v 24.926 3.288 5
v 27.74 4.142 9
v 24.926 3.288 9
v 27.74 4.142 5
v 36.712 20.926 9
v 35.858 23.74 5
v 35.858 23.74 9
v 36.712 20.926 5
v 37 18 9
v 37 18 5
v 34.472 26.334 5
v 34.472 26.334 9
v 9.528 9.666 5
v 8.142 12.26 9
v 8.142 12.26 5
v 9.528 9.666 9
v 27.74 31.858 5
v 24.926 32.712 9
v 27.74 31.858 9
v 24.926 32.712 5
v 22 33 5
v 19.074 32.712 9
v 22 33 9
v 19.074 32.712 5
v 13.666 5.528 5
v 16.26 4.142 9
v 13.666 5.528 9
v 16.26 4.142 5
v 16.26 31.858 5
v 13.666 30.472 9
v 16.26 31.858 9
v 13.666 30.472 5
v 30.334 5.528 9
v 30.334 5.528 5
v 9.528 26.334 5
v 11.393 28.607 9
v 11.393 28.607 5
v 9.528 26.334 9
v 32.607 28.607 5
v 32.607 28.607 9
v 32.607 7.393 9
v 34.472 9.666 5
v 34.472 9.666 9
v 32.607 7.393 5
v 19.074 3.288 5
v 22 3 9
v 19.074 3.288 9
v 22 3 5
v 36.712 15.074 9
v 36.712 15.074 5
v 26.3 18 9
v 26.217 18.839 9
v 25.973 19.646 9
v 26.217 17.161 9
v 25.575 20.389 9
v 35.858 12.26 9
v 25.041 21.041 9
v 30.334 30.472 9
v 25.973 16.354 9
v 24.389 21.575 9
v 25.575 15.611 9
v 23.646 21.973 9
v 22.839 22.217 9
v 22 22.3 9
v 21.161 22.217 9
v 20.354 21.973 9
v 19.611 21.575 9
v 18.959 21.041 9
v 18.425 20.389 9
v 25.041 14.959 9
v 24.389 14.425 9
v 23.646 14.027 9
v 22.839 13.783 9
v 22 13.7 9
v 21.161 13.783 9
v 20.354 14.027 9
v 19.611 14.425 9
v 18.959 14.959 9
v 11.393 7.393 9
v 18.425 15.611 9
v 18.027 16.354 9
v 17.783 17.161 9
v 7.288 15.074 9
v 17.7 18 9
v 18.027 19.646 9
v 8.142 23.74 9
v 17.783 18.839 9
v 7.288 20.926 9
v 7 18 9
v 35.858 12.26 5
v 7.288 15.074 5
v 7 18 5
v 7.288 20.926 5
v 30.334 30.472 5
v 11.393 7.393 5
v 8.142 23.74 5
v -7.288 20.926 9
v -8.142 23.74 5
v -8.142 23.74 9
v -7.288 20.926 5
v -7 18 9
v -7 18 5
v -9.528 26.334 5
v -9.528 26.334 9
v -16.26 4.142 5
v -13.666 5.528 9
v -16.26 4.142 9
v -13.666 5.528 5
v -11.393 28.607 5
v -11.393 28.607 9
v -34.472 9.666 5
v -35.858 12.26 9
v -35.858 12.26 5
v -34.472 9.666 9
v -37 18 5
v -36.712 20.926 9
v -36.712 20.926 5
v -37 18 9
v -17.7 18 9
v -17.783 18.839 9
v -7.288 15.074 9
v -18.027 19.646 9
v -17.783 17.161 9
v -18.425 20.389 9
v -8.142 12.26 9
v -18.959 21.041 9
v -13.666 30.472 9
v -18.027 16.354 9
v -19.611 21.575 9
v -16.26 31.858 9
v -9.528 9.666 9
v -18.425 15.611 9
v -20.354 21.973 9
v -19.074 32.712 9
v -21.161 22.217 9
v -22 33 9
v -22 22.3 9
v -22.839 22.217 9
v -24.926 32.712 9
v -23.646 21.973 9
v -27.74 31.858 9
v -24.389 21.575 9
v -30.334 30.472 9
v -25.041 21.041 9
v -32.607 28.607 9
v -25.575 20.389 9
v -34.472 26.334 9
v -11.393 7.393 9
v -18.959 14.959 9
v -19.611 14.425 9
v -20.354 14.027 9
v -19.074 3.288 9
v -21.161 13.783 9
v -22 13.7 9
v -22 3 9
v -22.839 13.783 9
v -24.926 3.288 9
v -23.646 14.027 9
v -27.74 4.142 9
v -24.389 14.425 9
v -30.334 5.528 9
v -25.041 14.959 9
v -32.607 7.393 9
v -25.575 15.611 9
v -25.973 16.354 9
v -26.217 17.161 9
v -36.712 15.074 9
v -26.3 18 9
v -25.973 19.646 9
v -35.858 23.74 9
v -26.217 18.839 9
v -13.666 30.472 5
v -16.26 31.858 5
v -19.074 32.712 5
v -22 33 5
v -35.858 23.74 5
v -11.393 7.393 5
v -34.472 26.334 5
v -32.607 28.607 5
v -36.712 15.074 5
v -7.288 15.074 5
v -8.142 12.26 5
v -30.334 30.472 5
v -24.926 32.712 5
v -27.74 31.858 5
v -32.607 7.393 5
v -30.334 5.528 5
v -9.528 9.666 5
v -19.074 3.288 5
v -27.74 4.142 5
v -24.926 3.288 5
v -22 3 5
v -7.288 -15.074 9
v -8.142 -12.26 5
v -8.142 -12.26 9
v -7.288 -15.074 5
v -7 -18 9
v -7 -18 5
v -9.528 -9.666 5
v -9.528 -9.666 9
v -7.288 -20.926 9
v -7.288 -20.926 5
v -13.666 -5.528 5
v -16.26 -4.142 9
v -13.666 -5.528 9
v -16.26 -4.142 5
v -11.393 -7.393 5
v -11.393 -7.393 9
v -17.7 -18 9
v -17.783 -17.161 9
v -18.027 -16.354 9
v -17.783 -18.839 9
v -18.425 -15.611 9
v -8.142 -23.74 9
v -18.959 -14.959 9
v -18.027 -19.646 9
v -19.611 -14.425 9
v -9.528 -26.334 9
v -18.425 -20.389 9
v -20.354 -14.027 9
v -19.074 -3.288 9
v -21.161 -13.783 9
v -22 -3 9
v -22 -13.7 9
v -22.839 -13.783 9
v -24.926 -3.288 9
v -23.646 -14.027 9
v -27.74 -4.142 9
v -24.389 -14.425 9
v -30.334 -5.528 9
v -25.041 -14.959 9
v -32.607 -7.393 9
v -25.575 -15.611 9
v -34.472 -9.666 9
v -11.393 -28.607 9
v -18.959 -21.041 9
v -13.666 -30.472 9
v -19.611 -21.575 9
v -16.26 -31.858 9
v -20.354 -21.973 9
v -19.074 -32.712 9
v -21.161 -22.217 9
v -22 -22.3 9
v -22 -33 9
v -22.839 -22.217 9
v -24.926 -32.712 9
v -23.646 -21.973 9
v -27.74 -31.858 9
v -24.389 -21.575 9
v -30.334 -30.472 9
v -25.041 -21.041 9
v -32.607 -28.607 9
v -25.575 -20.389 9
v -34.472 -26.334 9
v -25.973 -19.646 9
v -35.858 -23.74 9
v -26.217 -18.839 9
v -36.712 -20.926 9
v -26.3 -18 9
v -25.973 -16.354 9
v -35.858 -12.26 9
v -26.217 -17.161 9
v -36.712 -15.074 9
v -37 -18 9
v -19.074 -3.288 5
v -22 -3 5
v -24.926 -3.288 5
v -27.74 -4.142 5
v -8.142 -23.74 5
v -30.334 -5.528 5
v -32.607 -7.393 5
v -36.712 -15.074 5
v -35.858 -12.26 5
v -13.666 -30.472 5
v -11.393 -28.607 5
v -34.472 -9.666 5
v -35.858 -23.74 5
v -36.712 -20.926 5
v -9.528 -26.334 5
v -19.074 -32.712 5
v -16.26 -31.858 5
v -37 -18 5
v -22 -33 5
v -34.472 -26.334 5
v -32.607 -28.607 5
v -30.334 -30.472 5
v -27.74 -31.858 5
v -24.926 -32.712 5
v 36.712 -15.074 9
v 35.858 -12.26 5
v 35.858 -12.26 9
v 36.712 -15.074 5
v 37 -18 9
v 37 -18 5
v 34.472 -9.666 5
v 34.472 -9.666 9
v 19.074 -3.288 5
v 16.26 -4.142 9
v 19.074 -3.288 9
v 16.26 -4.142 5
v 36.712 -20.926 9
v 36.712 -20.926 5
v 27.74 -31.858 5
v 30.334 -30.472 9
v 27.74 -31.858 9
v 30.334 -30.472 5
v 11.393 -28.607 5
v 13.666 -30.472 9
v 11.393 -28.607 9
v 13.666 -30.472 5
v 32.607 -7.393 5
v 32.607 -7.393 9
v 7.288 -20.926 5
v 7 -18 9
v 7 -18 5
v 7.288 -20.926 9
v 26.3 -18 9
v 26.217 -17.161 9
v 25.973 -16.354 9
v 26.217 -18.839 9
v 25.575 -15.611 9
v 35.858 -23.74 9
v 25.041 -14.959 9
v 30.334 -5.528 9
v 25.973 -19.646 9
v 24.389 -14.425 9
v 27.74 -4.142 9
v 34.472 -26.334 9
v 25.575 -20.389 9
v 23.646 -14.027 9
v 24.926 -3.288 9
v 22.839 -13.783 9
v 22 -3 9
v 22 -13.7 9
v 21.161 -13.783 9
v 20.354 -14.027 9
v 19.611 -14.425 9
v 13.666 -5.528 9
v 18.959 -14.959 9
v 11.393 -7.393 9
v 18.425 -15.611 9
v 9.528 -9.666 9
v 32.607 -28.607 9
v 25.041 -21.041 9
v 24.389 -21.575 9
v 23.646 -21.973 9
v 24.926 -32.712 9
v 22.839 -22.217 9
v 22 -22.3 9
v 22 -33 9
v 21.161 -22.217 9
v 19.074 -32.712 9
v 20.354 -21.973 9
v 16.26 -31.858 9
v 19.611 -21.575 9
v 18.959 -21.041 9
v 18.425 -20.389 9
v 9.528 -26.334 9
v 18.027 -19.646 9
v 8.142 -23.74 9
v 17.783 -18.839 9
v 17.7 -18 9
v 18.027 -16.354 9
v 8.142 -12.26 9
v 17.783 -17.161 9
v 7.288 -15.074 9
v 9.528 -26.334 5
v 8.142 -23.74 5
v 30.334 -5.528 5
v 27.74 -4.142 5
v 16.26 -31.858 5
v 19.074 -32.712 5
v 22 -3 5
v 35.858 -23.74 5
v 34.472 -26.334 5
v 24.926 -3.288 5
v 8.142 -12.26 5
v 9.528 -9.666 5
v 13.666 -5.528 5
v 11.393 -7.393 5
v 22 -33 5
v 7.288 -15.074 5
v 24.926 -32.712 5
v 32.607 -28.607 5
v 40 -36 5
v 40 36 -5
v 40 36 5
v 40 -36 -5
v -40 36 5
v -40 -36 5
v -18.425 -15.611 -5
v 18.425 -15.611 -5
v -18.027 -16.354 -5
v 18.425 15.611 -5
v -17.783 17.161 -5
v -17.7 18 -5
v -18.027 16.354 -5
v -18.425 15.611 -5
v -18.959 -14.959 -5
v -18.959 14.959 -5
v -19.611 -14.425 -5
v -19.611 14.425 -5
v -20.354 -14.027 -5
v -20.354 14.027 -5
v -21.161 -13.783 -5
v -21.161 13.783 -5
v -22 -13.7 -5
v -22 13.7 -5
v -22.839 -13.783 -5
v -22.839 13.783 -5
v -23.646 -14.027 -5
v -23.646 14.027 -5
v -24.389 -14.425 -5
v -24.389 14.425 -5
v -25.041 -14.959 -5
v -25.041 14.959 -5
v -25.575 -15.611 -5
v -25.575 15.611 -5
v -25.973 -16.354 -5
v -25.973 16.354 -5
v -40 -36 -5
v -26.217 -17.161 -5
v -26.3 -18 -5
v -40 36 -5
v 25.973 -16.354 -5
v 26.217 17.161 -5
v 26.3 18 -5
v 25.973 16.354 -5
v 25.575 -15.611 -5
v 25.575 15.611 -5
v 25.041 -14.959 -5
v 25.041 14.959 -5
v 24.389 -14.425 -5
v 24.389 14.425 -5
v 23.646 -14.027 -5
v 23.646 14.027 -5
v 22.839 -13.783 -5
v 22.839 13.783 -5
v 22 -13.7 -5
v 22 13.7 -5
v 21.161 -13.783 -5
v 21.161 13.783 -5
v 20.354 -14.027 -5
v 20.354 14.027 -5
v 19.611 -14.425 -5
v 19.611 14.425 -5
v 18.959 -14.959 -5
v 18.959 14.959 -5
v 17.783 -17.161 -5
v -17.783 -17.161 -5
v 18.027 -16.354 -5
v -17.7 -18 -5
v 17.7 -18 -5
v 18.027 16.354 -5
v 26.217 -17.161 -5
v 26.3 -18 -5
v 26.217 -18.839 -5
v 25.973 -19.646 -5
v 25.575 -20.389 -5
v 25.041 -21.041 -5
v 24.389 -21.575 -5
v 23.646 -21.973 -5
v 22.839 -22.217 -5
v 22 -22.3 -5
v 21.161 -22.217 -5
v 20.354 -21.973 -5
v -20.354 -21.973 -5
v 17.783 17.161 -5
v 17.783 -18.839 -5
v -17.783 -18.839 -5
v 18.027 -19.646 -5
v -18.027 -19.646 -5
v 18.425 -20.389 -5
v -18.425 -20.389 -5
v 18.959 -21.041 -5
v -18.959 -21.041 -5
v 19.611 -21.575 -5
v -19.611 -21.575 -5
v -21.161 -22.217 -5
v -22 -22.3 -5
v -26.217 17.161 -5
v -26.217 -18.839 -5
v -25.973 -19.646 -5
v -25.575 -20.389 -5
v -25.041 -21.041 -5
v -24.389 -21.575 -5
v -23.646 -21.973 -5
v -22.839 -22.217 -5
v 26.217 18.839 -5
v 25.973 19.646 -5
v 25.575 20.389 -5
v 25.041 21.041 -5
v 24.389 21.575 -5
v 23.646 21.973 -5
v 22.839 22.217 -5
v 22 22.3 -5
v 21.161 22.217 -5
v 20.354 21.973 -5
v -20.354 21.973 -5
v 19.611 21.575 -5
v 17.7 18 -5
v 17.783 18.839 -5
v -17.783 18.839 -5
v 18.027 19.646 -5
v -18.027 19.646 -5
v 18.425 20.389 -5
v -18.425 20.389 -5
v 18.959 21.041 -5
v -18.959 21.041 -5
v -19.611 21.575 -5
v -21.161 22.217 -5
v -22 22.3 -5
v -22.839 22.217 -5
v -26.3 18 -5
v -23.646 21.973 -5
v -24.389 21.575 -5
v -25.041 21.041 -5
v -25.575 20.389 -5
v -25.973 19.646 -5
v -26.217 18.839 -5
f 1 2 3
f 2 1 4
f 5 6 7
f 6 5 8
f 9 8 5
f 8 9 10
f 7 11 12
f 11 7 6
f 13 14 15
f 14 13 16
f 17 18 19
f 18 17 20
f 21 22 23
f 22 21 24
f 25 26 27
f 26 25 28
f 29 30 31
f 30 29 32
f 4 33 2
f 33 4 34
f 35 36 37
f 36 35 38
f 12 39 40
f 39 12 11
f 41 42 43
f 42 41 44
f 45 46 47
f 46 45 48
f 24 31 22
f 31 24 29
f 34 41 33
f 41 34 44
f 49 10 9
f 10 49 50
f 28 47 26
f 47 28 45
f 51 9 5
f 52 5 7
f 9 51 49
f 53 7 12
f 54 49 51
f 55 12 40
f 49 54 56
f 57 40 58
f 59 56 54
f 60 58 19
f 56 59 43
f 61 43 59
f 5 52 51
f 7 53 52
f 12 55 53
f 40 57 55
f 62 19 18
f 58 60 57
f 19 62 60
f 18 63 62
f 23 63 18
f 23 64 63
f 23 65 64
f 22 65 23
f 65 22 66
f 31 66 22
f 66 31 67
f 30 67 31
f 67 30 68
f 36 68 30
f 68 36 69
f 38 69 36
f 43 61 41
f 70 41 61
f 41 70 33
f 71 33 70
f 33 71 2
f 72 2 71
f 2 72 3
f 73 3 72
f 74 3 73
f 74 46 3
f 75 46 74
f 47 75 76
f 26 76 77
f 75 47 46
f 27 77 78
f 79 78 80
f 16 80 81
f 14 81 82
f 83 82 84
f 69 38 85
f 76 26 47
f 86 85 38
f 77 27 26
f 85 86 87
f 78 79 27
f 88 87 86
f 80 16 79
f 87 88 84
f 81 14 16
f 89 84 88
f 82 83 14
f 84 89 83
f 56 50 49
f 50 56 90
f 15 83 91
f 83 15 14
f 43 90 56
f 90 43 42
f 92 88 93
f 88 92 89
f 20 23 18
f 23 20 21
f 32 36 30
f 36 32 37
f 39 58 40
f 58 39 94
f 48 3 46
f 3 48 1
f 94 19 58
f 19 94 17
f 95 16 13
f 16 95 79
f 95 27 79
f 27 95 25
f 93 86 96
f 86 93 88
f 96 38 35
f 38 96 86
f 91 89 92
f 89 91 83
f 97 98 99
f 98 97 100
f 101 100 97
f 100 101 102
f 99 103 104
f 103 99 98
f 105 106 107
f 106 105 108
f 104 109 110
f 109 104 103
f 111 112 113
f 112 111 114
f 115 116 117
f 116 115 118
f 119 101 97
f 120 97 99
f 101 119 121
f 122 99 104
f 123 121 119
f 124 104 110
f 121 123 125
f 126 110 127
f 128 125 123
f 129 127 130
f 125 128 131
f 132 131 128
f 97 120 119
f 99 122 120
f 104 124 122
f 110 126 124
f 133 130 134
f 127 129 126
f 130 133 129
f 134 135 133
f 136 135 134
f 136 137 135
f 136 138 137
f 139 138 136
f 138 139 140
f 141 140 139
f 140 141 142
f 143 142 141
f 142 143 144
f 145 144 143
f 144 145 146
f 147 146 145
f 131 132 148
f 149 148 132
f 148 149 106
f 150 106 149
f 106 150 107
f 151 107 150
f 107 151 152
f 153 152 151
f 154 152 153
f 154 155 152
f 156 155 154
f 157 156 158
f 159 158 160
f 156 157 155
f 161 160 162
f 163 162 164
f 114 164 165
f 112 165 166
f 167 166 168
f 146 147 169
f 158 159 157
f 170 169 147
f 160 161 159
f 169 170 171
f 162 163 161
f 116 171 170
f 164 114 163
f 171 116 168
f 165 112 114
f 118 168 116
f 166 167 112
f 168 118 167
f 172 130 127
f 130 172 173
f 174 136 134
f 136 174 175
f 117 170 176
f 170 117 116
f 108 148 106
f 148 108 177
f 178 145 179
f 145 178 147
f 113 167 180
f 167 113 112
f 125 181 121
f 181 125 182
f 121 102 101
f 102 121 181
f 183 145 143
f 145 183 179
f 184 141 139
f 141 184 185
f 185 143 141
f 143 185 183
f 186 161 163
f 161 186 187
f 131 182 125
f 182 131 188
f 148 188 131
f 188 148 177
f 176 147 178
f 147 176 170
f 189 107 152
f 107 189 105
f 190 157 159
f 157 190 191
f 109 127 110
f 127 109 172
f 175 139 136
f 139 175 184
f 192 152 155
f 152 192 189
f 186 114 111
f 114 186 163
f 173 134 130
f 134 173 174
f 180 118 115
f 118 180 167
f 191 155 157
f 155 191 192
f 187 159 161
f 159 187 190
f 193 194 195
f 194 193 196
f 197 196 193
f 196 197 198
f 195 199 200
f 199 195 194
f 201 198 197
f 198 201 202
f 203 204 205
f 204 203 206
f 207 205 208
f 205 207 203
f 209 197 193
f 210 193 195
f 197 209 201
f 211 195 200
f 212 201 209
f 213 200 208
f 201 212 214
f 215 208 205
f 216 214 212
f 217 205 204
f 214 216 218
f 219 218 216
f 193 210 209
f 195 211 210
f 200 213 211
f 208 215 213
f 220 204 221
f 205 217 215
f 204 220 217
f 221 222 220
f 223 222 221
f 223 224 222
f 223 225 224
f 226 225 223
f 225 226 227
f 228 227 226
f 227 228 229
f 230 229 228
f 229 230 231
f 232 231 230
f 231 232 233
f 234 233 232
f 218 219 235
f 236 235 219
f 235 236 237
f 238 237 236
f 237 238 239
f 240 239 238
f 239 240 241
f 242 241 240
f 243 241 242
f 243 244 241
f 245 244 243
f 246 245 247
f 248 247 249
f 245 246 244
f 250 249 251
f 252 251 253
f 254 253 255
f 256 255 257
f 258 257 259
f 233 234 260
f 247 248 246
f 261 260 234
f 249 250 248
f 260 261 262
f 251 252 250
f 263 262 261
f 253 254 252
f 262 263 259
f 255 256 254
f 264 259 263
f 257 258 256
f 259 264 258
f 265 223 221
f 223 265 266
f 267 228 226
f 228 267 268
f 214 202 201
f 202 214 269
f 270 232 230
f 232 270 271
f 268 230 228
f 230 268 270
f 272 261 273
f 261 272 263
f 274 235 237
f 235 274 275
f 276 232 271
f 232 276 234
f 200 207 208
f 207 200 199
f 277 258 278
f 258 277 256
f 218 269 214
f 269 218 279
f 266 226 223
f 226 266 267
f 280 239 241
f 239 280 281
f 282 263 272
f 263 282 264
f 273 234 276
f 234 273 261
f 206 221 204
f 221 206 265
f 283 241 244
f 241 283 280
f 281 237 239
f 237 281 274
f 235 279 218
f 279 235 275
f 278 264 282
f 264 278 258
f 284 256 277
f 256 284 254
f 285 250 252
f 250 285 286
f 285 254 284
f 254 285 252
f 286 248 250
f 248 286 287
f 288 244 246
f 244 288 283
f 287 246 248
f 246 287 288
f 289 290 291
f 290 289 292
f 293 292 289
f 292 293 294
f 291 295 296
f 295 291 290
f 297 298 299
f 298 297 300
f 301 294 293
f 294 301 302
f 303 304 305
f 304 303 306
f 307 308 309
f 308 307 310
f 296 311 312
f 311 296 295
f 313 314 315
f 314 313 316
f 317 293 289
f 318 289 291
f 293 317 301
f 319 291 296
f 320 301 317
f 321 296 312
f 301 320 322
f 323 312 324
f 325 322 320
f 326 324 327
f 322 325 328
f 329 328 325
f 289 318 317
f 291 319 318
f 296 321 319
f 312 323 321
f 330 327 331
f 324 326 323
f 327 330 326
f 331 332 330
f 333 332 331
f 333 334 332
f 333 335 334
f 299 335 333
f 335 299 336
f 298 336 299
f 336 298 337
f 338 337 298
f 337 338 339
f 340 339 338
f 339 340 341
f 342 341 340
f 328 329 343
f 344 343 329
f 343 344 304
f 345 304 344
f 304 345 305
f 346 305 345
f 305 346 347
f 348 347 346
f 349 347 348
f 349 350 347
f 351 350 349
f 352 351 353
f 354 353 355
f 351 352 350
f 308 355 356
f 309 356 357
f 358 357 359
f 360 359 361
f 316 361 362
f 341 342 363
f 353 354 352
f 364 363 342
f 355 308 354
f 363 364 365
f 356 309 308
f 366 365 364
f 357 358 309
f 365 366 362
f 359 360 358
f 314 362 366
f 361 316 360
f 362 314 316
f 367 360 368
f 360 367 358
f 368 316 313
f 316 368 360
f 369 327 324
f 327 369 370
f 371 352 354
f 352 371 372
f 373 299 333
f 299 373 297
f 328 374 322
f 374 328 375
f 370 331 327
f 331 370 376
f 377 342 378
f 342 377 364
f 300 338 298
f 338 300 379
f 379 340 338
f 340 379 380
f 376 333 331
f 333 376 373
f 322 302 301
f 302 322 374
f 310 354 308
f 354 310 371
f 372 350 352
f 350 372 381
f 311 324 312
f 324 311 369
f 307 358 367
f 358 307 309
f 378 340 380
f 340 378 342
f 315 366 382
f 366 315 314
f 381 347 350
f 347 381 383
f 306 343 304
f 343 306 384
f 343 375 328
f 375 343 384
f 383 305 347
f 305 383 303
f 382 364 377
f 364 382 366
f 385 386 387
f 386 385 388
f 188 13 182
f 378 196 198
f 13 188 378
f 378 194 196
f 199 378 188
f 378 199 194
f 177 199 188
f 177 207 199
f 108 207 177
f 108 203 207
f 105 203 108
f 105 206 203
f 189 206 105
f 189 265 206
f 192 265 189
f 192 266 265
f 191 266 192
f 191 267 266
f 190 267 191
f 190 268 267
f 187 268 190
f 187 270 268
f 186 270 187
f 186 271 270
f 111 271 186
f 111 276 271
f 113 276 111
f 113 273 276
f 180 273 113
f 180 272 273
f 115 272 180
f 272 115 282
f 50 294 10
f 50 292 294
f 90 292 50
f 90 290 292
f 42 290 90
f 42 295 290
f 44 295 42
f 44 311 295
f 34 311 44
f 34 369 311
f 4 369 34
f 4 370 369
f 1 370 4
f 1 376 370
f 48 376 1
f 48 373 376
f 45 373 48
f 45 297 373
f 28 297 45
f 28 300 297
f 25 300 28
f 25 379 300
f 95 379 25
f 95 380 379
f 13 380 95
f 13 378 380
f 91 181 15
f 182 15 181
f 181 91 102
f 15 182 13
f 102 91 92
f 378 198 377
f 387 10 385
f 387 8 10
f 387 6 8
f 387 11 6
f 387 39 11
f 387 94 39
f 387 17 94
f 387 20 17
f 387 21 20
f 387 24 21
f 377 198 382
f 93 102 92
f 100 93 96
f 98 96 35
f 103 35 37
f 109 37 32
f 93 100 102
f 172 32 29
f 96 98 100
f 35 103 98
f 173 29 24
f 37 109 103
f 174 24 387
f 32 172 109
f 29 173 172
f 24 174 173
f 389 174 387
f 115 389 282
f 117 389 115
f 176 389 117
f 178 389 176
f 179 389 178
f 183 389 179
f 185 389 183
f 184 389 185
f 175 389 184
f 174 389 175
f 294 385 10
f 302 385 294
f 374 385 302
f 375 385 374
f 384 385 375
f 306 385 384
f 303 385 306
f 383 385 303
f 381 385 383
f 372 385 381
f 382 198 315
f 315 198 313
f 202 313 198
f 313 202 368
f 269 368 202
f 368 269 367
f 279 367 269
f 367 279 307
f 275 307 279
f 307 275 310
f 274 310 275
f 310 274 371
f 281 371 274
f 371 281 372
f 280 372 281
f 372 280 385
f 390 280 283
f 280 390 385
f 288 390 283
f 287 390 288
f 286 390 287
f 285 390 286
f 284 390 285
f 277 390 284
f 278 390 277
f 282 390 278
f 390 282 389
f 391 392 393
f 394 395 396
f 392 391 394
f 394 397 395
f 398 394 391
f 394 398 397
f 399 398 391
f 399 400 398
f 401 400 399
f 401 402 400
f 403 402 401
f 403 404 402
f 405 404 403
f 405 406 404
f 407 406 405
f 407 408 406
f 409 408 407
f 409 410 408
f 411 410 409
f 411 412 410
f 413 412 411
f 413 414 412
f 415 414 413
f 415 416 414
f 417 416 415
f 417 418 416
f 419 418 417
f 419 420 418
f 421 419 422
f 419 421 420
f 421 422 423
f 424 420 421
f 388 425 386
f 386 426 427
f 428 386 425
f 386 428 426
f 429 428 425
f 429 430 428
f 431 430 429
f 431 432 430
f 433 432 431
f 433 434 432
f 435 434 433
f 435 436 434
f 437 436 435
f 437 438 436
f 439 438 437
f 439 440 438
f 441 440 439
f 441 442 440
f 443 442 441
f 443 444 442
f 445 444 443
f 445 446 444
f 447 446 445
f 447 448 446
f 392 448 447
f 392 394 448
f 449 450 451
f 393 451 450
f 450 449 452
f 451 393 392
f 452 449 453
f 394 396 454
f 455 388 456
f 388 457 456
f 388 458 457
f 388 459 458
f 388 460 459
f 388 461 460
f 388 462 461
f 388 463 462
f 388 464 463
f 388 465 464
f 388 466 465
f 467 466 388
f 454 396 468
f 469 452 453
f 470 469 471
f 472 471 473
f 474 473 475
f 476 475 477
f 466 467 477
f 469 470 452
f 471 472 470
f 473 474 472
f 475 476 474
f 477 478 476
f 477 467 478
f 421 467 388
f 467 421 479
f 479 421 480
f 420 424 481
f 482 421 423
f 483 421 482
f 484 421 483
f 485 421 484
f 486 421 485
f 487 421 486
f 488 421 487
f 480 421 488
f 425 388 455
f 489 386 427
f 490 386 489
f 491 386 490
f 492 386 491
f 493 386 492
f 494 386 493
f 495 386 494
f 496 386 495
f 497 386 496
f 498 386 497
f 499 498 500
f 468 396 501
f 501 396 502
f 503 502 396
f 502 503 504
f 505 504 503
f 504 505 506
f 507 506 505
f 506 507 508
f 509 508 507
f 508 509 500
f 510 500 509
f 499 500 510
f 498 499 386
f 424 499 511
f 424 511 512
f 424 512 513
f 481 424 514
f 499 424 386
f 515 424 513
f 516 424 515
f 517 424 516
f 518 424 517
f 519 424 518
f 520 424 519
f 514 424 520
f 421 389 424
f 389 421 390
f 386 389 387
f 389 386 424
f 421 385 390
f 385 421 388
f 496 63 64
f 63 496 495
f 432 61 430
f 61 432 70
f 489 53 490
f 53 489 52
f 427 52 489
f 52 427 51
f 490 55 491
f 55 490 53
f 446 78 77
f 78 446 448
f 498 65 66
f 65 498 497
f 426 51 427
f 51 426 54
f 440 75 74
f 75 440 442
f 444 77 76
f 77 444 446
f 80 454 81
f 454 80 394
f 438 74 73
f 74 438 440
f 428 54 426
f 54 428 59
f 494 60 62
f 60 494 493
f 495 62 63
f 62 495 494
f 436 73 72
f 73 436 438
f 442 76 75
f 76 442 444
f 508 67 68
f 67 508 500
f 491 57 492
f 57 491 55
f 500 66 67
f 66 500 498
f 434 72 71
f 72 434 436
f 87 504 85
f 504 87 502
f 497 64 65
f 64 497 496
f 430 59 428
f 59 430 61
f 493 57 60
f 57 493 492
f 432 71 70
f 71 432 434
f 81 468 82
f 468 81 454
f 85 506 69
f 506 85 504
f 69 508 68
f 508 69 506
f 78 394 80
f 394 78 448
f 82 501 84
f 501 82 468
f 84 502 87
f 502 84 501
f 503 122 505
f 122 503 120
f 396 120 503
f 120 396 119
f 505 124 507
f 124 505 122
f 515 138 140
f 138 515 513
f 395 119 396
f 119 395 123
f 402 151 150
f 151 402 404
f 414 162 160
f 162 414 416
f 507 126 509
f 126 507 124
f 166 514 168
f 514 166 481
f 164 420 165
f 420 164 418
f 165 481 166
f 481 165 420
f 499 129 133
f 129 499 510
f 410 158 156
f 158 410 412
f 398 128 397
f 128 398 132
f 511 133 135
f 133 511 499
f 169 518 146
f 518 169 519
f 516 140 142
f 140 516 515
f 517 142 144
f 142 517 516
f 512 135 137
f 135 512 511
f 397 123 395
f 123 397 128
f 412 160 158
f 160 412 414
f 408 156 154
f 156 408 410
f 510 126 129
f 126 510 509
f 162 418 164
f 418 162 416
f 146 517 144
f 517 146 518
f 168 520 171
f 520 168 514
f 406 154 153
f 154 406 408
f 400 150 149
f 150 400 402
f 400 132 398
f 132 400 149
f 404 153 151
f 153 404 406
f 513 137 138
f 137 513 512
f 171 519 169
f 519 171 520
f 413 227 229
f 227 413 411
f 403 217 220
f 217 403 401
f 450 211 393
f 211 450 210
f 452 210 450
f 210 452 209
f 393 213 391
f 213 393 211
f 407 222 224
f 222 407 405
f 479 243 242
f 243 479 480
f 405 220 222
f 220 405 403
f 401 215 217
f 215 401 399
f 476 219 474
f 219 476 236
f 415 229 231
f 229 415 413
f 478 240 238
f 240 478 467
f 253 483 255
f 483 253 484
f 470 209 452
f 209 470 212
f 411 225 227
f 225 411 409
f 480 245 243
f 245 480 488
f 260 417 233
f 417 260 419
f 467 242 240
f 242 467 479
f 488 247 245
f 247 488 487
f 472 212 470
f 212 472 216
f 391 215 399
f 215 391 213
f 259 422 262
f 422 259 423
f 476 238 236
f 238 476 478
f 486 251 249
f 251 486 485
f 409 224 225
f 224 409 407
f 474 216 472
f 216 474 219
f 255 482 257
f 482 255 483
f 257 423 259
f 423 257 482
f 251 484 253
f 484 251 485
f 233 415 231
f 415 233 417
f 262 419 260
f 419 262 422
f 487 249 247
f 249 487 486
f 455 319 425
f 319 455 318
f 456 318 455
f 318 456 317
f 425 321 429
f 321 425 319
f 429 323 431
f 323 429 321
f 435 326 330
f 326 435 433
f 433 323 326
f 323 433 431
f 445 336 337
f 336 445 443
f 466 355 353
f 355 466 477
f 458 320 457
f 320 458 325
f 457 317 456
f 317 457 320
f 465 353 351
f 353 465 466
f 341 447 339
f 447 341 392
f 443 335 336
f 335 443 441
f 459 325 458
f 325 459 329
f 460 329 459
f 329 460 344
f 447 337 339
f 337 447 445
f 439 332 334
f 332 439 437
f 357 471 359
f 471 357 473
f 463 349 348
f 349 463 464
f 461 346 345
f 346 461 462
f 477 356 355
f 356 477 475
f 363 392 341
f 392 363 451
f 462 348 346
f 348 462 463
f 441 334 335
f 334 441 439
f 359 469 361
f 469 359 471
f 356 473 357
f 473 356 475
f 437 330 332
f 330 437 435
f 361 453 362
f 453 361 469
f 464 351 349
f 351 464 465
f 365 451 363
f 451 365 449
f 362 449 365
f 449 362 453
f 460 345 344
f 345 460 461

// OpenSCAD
$fn = 32;

// ----------------------------------------------------------------------
// Anchor pads 80 x 72 x 14
// four corner bosses with anchor holes
// ----------------------------------------------------------------------

// --- parameters (mm) ---
plate = [80, 72, 10];   // base plate size (x, y, z)
pads = 4;               // boss count, one per corner
edge = 18;              // boss centre offset from the plate edge
boss_d = 30;            // boss diameter
boss_h = 4;             // boss height above the base plate
bore_d = 8.4;           // nominal hole diameter from the drawing
print_allowance = 0.2;  // clearance added for printing

// --- derived feature positions (mm) ---
hole_d = bore_d + print_allowance;  // = 8.6   hole diameter as printed
height = plate[2] + boss_h;         // = 14   overall height of the part
corner_x = plate[0] / 2 - edge;     // = 22   boss centre X
corner_y = plate[1] / 2 - edge;     // = 18   boss centre Y
feature_centers = [
  [corner_x, corner_y],
  [-corner_x, corner_y],
  [-corner_x, -corner_y],
  [corner_x, -corner_y]
];   // boss centres, anchor holes are drilled there

// base plate, four bosses standing on it, anchor holes all the way through
difference() {
  union() {
    cube(plate, center = true);
    for (centre = feature_centers)
      translate([centre[0], centre[1], plate[2] / 2 - 1])
        cylinder(d = boss_d, h = boss_h + 1);
  }
  for (centre = feature_centers)
    translate([centre[0], centre[1], -height])
      cylinder(d = hole_d, h = 2 * height + 2);  // through boss and plate
}
